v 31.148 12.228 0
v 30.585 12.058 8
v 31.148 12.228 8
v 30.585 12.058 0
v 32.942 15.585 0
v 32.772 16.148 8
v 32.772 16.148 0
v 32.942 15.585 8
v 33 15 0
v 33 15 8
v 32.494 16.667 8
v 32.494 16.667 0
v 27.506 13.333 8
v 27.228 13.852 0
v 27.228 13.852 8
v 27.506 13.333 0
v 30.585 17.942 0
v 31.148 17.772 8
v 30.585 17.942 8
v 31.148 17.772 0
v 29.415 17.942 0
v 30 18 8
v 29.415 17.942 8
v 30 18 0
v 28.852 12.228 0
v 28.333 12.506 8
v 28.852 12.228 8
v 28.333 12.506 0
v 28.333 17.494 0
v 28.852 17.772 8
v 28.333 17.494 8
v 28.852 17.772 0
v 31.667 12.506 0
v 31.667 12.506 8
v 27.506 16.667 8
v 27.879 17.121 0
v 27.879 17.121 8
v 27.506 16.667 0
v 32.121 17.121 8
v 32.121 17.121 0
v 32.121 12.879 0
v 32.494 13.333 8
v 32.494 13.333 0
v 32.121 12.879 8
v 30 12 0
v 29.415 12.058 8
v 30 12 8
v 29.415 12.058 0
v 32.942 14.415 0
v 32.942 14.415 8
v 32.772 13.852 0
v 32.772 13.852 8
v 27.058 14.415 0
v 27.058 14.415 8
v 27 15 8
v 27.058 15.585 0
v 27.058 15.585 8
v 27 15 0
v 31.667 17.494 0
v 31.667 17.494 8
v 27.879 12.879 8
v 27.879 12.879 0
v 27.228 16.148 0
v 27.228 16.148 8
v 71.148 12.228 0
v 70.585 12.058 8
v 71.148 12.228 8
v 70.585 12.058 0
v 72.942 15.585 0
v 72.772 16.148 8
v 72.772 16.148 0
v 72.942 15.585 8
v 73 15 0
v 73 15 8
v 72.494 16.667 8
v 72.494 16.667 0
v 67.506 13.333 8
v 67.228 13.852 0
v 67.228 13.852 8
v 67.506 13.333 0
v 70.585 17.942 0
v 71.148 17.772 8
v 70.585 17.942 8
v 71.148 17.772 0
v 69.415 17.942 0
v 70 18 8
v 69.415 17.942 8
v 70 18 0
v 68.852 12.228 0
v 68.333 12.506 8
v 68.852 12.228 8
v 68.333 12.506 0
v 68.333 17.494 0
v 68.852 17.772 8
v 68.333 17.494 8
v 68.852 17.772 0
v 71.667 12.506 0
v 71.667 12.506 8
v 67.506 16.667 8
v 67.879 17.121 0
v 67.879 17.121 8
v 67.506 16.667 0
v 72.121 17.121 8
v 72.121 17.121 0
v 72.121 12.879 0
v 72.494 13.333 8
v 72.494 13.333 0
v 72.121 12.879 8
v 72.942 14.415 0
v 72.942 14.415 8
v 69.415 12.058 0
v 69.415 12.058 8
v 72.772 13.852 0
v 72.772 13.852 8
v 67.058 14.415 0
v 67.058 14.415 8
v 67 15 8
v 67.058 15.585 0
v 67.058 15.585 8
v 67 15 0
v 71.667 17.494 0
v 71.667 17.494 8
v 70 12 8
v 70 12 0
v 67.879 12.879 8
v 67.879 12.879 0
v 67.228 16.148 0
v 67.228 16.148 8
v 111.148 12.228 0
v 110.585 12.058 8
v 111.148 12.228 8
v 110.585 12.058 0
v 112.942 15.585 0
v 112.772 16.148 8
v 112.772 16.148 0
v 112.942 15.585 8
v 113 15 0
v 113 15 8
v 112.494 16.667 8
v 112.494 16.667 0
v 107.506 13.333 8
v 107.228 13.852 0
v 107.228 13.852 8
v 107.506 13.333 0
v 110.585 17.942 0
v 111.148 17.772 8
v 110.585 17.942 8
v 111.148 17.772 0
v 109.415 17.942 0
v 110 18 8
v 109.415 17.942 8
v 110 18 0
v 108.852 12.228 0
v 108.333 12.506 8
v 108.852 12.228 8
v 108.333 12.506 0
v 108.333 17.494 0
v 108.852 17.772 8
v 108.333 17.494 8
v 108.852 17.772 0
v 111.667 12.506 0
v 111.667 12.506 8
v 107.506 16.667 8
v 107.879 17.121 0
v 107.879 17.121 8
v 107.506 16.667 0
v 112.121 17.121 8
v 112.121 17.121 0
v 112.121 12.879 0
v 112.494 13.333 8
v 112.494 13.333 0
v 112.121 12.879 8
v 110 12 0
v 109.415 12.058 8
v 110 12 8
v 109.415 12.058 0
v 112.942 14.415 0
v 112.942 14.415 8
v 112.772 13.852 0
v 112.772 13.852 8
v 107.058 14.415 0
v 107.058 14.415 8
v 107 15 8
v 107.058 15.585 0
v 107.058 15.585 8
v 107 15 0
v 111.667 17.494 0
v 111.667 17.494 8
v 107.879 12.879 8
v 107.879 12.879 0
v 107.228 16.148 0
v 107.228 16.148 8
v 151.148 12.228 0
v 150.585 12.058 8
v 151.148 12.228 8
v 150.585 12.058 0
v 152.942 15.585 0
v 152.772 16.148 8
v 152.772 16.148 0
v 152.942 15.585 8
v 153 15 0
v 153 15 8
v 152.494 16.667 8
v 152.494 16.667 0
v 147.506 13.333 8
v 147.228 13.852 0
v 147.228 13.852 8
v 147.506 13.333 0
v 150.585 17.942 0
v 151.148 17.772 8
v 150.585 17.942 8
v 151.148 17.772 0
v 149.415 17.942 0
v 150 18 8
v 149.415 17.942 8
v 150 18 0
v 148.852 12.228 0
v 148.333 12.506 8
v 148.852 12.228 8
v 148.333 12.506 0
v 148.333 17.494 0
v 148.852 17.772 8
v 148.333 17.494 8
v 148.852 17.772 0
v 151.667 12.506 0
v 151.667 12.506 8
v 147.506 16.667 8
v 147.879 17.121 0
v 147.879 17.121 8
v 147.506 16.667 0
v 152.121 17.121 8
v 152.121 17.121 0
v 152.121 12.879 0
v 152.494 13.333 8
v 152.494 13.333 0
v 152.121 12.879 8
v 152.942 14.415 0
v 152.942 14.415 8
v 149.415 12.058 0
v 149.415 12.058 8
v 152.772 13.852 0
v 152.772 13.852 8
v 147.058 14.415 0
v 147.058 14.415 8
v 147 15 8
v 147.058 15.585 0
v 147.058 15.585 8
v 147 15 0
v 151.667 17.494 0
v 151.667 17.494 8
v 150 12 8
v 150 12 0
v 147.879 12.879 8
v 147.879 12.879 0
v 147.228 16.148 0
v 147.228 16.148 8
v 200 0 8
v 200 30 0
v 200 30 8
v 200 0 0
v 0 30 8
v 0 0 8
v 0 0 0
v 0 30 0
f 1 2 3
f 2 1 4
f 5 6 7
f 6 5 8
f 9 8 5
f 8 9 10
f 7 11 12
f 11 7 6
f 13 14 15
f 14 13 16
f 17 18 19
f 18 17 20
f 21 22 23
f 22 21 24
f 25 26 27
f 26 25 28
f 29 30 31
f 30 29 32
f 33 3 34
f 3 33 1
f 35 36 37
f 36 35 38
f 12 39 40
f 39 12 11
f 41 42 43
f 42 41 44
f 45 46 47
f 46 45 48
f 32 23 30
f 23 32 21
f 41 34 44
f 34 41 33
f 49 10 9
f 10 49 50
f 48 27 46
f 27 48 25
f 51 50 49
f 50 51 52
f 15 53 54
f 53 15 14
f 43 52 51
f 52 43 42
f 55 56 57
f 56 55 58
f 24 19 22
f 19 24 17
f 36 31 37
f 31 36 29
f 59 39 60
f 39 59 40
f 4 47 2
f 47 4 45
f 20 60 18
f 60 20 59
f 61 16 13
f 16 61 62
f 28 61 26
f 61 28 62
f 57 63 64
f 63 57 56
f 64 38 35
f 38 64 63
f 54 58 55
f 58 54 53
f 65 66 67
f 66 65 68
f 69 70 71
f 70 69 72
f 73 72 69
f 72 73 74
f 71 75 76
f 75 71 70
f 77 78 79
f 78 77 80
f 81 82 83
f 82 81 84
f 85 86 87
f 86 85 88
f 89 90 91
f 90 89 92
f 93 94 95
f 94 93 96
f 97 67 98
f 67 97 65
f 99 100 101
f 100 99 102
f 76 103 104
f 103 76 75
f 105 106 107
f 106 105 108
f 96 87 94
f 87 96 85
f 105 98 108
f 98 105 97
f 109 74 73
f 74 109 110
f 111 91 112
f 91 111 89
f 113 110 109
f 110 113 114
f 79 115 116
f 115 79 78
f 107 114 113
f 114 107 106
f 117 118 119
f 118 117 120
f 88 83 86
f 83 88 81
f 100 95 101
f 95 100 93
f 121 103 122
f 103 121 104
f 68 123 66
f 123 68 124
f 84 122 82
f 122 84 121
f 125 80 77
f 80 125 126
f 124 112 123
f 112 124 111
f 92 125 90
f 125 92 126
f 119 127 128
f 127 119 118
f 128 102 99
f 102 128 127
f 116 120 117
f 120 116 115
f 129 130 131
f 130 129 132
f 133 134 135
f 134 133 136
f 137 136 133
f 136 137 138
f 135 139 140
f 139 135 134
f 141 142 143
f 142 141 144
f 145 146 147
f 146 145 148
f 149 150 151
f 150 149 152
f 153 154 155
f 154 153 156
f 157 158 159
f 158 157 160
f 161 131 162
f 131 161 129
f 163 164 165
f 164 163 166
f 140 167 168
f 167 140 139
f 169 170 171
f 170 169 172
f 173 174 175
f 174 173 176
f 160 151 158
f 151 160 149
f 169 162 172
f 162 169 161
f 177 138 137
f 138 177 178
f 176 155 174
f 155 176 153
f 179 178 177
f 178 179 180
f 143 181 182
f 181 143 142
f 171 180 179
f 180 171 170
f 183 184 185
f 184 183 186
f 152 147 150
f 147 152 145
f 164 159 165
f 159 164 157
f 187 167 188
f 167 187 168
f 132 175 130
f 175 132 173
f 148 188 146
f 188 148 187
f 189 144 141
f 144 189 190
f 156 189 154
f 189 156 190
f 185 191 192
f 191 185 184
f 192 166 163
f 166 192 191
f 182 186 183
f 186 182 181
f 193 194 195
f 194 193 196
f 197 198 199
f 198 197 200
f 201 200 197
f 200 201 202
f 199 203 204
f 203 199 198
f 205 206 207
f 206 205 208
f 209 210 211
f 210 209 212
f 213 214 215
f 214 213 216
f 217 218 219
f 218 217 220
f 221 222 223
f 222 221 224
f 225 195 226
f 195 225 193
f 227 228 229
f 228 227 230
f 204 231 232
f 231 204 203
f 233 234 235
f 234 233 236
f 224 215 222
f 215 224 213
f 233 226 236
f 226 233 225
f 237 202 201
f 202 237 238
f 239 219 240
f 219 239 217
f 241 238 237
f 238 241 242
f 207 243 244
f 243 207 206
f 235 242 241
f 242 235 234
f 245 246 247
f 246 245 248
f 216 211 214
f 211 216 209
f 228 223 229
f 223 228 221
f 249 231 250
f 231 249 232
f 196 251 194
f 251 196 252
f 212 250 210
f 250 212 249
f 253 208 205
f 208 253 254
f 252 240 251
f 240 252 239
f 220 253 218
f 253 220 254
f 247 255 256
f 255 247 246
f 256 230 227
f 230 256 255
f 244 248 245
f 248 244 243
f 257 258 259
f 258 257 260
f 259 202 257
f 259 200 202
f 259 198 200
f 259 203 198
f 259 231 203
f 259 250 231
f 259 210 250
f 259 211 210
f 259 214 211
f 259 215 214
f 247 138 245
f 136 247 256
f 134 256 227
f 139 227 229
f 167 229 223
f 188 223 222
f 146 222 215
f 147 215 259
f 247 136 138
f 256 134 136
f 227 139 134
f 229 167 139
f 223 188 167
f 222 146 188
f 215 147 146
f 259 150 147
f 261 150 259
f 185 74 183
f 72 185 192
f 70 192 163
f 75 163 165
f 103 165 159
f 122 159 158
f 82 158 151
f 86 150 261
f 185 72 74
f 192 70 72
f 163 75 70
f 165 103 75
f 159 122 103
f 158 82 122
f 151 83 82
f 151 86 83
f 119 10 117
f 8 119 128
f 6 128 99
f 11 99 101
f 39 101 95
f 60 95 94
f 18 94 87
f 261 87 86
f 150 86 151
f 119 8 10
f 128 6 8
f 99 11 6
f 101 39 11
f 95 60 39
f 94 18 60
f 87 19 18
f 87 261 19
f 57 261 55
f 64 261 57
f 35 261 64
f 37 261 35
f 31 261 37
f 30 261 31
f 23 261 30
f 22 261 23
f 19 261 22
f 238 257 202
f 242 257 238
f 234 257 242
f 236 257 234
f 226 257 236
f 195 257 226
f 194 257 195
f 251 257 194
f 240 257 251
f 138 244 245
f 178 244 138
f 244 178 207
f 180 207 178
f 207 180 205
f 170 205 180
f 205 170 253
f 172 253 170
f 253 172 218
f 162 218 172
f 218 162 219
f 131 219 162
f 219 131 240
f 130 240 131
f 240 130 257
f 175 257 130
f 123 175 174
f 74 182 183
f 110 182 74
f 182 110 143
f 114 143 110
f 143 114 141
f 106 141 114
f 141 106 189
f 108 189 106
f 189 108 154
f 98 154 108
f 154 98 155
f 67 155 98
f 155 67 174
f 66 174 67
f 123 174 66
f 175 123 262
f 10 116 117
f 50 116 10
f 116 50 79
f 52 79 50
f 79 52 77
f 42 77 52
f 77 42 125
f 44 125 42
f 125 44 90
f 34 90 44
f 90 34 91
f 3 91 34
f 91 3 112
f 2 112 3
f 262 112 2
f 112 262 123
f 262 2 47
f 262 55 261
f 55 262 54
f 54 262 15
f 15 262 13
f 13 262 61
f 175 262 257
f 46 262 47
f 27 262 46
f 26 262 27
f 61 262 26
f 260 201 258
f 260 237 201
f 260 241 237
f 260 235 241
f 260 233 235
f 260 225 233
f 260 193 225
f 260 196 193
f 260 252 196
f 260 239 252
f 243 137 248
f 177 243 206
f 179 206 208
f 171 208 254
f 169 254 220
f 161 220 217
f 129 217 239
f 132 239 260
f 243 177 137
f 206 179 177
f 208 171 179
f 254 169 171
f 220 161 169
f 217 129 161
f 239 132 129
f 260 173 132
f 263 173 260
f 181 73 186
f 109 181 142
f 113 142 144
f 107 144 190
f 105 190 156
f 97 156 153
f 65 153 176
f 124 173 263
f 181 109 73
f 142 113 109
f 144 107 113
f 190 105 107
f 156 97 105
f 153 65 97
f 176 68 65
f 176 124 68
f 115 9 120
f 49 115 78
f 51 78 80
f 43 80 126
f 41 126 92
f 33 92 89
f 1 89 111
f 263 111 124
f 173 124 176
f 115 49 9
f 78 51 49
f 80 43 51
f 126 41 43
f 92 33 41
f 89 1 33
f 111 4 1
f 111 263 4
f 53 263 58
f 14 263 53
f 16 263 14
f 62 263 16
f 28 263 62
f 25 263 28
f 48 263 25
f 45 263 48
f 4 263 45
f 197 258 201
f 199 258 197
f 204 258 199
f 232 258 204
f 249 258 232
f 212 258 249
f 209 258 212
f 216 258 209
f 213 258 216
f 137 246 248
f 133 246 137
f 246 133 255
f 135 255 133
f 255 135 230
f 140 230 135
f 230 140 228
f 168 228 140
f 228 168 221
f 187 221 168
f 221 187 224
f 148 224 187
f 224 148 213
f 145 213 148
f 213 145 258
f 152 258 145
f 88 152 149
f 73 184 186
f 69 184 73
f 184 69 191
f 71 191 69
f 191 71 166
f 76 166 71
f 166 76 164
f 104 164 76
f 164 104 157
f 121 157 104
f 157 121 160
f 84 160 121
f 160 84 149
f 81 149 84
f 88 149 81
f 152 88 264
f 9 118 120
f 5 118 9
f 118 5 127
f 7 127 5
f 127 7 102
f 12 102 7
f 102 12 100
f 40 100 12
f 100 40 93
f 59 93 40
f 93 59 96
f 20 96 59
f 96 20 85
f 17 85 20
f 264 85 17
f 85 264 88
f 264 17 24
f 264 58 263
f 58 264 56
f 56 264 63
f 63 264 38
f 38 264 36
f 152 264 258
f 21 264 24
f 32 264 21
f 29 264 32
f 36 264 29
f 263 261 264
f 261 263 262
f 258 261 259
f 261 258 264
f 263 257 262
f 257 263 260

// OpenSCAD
$fn = 32;

// ----------------------------------------------------------------------
// Long rail: 200-250 mm mounting rail
// ----------------------------------------------------------------------

// --- parameters (mm) ---
rail_l = 200;             // rail length, X
rail_w = 30;              // rail width, Y
rail_t = 8;               // rail thickness, Z
hole_d = 6;               // mounting hole diameter
hole_start = 30;          // first hole offset from the end
hole_pitch = 40;          // hole pitch
holes = 4;                // number of holes

difference() {
  cube([rail_l, rail_w, rail_t]);
  for (i = [0 : holes - 1])
    translate([hole_start + i * hole_pitch, rail_w / 2, -1])
      cylinder(h = rail_t + 2, d = hole_d);
}
